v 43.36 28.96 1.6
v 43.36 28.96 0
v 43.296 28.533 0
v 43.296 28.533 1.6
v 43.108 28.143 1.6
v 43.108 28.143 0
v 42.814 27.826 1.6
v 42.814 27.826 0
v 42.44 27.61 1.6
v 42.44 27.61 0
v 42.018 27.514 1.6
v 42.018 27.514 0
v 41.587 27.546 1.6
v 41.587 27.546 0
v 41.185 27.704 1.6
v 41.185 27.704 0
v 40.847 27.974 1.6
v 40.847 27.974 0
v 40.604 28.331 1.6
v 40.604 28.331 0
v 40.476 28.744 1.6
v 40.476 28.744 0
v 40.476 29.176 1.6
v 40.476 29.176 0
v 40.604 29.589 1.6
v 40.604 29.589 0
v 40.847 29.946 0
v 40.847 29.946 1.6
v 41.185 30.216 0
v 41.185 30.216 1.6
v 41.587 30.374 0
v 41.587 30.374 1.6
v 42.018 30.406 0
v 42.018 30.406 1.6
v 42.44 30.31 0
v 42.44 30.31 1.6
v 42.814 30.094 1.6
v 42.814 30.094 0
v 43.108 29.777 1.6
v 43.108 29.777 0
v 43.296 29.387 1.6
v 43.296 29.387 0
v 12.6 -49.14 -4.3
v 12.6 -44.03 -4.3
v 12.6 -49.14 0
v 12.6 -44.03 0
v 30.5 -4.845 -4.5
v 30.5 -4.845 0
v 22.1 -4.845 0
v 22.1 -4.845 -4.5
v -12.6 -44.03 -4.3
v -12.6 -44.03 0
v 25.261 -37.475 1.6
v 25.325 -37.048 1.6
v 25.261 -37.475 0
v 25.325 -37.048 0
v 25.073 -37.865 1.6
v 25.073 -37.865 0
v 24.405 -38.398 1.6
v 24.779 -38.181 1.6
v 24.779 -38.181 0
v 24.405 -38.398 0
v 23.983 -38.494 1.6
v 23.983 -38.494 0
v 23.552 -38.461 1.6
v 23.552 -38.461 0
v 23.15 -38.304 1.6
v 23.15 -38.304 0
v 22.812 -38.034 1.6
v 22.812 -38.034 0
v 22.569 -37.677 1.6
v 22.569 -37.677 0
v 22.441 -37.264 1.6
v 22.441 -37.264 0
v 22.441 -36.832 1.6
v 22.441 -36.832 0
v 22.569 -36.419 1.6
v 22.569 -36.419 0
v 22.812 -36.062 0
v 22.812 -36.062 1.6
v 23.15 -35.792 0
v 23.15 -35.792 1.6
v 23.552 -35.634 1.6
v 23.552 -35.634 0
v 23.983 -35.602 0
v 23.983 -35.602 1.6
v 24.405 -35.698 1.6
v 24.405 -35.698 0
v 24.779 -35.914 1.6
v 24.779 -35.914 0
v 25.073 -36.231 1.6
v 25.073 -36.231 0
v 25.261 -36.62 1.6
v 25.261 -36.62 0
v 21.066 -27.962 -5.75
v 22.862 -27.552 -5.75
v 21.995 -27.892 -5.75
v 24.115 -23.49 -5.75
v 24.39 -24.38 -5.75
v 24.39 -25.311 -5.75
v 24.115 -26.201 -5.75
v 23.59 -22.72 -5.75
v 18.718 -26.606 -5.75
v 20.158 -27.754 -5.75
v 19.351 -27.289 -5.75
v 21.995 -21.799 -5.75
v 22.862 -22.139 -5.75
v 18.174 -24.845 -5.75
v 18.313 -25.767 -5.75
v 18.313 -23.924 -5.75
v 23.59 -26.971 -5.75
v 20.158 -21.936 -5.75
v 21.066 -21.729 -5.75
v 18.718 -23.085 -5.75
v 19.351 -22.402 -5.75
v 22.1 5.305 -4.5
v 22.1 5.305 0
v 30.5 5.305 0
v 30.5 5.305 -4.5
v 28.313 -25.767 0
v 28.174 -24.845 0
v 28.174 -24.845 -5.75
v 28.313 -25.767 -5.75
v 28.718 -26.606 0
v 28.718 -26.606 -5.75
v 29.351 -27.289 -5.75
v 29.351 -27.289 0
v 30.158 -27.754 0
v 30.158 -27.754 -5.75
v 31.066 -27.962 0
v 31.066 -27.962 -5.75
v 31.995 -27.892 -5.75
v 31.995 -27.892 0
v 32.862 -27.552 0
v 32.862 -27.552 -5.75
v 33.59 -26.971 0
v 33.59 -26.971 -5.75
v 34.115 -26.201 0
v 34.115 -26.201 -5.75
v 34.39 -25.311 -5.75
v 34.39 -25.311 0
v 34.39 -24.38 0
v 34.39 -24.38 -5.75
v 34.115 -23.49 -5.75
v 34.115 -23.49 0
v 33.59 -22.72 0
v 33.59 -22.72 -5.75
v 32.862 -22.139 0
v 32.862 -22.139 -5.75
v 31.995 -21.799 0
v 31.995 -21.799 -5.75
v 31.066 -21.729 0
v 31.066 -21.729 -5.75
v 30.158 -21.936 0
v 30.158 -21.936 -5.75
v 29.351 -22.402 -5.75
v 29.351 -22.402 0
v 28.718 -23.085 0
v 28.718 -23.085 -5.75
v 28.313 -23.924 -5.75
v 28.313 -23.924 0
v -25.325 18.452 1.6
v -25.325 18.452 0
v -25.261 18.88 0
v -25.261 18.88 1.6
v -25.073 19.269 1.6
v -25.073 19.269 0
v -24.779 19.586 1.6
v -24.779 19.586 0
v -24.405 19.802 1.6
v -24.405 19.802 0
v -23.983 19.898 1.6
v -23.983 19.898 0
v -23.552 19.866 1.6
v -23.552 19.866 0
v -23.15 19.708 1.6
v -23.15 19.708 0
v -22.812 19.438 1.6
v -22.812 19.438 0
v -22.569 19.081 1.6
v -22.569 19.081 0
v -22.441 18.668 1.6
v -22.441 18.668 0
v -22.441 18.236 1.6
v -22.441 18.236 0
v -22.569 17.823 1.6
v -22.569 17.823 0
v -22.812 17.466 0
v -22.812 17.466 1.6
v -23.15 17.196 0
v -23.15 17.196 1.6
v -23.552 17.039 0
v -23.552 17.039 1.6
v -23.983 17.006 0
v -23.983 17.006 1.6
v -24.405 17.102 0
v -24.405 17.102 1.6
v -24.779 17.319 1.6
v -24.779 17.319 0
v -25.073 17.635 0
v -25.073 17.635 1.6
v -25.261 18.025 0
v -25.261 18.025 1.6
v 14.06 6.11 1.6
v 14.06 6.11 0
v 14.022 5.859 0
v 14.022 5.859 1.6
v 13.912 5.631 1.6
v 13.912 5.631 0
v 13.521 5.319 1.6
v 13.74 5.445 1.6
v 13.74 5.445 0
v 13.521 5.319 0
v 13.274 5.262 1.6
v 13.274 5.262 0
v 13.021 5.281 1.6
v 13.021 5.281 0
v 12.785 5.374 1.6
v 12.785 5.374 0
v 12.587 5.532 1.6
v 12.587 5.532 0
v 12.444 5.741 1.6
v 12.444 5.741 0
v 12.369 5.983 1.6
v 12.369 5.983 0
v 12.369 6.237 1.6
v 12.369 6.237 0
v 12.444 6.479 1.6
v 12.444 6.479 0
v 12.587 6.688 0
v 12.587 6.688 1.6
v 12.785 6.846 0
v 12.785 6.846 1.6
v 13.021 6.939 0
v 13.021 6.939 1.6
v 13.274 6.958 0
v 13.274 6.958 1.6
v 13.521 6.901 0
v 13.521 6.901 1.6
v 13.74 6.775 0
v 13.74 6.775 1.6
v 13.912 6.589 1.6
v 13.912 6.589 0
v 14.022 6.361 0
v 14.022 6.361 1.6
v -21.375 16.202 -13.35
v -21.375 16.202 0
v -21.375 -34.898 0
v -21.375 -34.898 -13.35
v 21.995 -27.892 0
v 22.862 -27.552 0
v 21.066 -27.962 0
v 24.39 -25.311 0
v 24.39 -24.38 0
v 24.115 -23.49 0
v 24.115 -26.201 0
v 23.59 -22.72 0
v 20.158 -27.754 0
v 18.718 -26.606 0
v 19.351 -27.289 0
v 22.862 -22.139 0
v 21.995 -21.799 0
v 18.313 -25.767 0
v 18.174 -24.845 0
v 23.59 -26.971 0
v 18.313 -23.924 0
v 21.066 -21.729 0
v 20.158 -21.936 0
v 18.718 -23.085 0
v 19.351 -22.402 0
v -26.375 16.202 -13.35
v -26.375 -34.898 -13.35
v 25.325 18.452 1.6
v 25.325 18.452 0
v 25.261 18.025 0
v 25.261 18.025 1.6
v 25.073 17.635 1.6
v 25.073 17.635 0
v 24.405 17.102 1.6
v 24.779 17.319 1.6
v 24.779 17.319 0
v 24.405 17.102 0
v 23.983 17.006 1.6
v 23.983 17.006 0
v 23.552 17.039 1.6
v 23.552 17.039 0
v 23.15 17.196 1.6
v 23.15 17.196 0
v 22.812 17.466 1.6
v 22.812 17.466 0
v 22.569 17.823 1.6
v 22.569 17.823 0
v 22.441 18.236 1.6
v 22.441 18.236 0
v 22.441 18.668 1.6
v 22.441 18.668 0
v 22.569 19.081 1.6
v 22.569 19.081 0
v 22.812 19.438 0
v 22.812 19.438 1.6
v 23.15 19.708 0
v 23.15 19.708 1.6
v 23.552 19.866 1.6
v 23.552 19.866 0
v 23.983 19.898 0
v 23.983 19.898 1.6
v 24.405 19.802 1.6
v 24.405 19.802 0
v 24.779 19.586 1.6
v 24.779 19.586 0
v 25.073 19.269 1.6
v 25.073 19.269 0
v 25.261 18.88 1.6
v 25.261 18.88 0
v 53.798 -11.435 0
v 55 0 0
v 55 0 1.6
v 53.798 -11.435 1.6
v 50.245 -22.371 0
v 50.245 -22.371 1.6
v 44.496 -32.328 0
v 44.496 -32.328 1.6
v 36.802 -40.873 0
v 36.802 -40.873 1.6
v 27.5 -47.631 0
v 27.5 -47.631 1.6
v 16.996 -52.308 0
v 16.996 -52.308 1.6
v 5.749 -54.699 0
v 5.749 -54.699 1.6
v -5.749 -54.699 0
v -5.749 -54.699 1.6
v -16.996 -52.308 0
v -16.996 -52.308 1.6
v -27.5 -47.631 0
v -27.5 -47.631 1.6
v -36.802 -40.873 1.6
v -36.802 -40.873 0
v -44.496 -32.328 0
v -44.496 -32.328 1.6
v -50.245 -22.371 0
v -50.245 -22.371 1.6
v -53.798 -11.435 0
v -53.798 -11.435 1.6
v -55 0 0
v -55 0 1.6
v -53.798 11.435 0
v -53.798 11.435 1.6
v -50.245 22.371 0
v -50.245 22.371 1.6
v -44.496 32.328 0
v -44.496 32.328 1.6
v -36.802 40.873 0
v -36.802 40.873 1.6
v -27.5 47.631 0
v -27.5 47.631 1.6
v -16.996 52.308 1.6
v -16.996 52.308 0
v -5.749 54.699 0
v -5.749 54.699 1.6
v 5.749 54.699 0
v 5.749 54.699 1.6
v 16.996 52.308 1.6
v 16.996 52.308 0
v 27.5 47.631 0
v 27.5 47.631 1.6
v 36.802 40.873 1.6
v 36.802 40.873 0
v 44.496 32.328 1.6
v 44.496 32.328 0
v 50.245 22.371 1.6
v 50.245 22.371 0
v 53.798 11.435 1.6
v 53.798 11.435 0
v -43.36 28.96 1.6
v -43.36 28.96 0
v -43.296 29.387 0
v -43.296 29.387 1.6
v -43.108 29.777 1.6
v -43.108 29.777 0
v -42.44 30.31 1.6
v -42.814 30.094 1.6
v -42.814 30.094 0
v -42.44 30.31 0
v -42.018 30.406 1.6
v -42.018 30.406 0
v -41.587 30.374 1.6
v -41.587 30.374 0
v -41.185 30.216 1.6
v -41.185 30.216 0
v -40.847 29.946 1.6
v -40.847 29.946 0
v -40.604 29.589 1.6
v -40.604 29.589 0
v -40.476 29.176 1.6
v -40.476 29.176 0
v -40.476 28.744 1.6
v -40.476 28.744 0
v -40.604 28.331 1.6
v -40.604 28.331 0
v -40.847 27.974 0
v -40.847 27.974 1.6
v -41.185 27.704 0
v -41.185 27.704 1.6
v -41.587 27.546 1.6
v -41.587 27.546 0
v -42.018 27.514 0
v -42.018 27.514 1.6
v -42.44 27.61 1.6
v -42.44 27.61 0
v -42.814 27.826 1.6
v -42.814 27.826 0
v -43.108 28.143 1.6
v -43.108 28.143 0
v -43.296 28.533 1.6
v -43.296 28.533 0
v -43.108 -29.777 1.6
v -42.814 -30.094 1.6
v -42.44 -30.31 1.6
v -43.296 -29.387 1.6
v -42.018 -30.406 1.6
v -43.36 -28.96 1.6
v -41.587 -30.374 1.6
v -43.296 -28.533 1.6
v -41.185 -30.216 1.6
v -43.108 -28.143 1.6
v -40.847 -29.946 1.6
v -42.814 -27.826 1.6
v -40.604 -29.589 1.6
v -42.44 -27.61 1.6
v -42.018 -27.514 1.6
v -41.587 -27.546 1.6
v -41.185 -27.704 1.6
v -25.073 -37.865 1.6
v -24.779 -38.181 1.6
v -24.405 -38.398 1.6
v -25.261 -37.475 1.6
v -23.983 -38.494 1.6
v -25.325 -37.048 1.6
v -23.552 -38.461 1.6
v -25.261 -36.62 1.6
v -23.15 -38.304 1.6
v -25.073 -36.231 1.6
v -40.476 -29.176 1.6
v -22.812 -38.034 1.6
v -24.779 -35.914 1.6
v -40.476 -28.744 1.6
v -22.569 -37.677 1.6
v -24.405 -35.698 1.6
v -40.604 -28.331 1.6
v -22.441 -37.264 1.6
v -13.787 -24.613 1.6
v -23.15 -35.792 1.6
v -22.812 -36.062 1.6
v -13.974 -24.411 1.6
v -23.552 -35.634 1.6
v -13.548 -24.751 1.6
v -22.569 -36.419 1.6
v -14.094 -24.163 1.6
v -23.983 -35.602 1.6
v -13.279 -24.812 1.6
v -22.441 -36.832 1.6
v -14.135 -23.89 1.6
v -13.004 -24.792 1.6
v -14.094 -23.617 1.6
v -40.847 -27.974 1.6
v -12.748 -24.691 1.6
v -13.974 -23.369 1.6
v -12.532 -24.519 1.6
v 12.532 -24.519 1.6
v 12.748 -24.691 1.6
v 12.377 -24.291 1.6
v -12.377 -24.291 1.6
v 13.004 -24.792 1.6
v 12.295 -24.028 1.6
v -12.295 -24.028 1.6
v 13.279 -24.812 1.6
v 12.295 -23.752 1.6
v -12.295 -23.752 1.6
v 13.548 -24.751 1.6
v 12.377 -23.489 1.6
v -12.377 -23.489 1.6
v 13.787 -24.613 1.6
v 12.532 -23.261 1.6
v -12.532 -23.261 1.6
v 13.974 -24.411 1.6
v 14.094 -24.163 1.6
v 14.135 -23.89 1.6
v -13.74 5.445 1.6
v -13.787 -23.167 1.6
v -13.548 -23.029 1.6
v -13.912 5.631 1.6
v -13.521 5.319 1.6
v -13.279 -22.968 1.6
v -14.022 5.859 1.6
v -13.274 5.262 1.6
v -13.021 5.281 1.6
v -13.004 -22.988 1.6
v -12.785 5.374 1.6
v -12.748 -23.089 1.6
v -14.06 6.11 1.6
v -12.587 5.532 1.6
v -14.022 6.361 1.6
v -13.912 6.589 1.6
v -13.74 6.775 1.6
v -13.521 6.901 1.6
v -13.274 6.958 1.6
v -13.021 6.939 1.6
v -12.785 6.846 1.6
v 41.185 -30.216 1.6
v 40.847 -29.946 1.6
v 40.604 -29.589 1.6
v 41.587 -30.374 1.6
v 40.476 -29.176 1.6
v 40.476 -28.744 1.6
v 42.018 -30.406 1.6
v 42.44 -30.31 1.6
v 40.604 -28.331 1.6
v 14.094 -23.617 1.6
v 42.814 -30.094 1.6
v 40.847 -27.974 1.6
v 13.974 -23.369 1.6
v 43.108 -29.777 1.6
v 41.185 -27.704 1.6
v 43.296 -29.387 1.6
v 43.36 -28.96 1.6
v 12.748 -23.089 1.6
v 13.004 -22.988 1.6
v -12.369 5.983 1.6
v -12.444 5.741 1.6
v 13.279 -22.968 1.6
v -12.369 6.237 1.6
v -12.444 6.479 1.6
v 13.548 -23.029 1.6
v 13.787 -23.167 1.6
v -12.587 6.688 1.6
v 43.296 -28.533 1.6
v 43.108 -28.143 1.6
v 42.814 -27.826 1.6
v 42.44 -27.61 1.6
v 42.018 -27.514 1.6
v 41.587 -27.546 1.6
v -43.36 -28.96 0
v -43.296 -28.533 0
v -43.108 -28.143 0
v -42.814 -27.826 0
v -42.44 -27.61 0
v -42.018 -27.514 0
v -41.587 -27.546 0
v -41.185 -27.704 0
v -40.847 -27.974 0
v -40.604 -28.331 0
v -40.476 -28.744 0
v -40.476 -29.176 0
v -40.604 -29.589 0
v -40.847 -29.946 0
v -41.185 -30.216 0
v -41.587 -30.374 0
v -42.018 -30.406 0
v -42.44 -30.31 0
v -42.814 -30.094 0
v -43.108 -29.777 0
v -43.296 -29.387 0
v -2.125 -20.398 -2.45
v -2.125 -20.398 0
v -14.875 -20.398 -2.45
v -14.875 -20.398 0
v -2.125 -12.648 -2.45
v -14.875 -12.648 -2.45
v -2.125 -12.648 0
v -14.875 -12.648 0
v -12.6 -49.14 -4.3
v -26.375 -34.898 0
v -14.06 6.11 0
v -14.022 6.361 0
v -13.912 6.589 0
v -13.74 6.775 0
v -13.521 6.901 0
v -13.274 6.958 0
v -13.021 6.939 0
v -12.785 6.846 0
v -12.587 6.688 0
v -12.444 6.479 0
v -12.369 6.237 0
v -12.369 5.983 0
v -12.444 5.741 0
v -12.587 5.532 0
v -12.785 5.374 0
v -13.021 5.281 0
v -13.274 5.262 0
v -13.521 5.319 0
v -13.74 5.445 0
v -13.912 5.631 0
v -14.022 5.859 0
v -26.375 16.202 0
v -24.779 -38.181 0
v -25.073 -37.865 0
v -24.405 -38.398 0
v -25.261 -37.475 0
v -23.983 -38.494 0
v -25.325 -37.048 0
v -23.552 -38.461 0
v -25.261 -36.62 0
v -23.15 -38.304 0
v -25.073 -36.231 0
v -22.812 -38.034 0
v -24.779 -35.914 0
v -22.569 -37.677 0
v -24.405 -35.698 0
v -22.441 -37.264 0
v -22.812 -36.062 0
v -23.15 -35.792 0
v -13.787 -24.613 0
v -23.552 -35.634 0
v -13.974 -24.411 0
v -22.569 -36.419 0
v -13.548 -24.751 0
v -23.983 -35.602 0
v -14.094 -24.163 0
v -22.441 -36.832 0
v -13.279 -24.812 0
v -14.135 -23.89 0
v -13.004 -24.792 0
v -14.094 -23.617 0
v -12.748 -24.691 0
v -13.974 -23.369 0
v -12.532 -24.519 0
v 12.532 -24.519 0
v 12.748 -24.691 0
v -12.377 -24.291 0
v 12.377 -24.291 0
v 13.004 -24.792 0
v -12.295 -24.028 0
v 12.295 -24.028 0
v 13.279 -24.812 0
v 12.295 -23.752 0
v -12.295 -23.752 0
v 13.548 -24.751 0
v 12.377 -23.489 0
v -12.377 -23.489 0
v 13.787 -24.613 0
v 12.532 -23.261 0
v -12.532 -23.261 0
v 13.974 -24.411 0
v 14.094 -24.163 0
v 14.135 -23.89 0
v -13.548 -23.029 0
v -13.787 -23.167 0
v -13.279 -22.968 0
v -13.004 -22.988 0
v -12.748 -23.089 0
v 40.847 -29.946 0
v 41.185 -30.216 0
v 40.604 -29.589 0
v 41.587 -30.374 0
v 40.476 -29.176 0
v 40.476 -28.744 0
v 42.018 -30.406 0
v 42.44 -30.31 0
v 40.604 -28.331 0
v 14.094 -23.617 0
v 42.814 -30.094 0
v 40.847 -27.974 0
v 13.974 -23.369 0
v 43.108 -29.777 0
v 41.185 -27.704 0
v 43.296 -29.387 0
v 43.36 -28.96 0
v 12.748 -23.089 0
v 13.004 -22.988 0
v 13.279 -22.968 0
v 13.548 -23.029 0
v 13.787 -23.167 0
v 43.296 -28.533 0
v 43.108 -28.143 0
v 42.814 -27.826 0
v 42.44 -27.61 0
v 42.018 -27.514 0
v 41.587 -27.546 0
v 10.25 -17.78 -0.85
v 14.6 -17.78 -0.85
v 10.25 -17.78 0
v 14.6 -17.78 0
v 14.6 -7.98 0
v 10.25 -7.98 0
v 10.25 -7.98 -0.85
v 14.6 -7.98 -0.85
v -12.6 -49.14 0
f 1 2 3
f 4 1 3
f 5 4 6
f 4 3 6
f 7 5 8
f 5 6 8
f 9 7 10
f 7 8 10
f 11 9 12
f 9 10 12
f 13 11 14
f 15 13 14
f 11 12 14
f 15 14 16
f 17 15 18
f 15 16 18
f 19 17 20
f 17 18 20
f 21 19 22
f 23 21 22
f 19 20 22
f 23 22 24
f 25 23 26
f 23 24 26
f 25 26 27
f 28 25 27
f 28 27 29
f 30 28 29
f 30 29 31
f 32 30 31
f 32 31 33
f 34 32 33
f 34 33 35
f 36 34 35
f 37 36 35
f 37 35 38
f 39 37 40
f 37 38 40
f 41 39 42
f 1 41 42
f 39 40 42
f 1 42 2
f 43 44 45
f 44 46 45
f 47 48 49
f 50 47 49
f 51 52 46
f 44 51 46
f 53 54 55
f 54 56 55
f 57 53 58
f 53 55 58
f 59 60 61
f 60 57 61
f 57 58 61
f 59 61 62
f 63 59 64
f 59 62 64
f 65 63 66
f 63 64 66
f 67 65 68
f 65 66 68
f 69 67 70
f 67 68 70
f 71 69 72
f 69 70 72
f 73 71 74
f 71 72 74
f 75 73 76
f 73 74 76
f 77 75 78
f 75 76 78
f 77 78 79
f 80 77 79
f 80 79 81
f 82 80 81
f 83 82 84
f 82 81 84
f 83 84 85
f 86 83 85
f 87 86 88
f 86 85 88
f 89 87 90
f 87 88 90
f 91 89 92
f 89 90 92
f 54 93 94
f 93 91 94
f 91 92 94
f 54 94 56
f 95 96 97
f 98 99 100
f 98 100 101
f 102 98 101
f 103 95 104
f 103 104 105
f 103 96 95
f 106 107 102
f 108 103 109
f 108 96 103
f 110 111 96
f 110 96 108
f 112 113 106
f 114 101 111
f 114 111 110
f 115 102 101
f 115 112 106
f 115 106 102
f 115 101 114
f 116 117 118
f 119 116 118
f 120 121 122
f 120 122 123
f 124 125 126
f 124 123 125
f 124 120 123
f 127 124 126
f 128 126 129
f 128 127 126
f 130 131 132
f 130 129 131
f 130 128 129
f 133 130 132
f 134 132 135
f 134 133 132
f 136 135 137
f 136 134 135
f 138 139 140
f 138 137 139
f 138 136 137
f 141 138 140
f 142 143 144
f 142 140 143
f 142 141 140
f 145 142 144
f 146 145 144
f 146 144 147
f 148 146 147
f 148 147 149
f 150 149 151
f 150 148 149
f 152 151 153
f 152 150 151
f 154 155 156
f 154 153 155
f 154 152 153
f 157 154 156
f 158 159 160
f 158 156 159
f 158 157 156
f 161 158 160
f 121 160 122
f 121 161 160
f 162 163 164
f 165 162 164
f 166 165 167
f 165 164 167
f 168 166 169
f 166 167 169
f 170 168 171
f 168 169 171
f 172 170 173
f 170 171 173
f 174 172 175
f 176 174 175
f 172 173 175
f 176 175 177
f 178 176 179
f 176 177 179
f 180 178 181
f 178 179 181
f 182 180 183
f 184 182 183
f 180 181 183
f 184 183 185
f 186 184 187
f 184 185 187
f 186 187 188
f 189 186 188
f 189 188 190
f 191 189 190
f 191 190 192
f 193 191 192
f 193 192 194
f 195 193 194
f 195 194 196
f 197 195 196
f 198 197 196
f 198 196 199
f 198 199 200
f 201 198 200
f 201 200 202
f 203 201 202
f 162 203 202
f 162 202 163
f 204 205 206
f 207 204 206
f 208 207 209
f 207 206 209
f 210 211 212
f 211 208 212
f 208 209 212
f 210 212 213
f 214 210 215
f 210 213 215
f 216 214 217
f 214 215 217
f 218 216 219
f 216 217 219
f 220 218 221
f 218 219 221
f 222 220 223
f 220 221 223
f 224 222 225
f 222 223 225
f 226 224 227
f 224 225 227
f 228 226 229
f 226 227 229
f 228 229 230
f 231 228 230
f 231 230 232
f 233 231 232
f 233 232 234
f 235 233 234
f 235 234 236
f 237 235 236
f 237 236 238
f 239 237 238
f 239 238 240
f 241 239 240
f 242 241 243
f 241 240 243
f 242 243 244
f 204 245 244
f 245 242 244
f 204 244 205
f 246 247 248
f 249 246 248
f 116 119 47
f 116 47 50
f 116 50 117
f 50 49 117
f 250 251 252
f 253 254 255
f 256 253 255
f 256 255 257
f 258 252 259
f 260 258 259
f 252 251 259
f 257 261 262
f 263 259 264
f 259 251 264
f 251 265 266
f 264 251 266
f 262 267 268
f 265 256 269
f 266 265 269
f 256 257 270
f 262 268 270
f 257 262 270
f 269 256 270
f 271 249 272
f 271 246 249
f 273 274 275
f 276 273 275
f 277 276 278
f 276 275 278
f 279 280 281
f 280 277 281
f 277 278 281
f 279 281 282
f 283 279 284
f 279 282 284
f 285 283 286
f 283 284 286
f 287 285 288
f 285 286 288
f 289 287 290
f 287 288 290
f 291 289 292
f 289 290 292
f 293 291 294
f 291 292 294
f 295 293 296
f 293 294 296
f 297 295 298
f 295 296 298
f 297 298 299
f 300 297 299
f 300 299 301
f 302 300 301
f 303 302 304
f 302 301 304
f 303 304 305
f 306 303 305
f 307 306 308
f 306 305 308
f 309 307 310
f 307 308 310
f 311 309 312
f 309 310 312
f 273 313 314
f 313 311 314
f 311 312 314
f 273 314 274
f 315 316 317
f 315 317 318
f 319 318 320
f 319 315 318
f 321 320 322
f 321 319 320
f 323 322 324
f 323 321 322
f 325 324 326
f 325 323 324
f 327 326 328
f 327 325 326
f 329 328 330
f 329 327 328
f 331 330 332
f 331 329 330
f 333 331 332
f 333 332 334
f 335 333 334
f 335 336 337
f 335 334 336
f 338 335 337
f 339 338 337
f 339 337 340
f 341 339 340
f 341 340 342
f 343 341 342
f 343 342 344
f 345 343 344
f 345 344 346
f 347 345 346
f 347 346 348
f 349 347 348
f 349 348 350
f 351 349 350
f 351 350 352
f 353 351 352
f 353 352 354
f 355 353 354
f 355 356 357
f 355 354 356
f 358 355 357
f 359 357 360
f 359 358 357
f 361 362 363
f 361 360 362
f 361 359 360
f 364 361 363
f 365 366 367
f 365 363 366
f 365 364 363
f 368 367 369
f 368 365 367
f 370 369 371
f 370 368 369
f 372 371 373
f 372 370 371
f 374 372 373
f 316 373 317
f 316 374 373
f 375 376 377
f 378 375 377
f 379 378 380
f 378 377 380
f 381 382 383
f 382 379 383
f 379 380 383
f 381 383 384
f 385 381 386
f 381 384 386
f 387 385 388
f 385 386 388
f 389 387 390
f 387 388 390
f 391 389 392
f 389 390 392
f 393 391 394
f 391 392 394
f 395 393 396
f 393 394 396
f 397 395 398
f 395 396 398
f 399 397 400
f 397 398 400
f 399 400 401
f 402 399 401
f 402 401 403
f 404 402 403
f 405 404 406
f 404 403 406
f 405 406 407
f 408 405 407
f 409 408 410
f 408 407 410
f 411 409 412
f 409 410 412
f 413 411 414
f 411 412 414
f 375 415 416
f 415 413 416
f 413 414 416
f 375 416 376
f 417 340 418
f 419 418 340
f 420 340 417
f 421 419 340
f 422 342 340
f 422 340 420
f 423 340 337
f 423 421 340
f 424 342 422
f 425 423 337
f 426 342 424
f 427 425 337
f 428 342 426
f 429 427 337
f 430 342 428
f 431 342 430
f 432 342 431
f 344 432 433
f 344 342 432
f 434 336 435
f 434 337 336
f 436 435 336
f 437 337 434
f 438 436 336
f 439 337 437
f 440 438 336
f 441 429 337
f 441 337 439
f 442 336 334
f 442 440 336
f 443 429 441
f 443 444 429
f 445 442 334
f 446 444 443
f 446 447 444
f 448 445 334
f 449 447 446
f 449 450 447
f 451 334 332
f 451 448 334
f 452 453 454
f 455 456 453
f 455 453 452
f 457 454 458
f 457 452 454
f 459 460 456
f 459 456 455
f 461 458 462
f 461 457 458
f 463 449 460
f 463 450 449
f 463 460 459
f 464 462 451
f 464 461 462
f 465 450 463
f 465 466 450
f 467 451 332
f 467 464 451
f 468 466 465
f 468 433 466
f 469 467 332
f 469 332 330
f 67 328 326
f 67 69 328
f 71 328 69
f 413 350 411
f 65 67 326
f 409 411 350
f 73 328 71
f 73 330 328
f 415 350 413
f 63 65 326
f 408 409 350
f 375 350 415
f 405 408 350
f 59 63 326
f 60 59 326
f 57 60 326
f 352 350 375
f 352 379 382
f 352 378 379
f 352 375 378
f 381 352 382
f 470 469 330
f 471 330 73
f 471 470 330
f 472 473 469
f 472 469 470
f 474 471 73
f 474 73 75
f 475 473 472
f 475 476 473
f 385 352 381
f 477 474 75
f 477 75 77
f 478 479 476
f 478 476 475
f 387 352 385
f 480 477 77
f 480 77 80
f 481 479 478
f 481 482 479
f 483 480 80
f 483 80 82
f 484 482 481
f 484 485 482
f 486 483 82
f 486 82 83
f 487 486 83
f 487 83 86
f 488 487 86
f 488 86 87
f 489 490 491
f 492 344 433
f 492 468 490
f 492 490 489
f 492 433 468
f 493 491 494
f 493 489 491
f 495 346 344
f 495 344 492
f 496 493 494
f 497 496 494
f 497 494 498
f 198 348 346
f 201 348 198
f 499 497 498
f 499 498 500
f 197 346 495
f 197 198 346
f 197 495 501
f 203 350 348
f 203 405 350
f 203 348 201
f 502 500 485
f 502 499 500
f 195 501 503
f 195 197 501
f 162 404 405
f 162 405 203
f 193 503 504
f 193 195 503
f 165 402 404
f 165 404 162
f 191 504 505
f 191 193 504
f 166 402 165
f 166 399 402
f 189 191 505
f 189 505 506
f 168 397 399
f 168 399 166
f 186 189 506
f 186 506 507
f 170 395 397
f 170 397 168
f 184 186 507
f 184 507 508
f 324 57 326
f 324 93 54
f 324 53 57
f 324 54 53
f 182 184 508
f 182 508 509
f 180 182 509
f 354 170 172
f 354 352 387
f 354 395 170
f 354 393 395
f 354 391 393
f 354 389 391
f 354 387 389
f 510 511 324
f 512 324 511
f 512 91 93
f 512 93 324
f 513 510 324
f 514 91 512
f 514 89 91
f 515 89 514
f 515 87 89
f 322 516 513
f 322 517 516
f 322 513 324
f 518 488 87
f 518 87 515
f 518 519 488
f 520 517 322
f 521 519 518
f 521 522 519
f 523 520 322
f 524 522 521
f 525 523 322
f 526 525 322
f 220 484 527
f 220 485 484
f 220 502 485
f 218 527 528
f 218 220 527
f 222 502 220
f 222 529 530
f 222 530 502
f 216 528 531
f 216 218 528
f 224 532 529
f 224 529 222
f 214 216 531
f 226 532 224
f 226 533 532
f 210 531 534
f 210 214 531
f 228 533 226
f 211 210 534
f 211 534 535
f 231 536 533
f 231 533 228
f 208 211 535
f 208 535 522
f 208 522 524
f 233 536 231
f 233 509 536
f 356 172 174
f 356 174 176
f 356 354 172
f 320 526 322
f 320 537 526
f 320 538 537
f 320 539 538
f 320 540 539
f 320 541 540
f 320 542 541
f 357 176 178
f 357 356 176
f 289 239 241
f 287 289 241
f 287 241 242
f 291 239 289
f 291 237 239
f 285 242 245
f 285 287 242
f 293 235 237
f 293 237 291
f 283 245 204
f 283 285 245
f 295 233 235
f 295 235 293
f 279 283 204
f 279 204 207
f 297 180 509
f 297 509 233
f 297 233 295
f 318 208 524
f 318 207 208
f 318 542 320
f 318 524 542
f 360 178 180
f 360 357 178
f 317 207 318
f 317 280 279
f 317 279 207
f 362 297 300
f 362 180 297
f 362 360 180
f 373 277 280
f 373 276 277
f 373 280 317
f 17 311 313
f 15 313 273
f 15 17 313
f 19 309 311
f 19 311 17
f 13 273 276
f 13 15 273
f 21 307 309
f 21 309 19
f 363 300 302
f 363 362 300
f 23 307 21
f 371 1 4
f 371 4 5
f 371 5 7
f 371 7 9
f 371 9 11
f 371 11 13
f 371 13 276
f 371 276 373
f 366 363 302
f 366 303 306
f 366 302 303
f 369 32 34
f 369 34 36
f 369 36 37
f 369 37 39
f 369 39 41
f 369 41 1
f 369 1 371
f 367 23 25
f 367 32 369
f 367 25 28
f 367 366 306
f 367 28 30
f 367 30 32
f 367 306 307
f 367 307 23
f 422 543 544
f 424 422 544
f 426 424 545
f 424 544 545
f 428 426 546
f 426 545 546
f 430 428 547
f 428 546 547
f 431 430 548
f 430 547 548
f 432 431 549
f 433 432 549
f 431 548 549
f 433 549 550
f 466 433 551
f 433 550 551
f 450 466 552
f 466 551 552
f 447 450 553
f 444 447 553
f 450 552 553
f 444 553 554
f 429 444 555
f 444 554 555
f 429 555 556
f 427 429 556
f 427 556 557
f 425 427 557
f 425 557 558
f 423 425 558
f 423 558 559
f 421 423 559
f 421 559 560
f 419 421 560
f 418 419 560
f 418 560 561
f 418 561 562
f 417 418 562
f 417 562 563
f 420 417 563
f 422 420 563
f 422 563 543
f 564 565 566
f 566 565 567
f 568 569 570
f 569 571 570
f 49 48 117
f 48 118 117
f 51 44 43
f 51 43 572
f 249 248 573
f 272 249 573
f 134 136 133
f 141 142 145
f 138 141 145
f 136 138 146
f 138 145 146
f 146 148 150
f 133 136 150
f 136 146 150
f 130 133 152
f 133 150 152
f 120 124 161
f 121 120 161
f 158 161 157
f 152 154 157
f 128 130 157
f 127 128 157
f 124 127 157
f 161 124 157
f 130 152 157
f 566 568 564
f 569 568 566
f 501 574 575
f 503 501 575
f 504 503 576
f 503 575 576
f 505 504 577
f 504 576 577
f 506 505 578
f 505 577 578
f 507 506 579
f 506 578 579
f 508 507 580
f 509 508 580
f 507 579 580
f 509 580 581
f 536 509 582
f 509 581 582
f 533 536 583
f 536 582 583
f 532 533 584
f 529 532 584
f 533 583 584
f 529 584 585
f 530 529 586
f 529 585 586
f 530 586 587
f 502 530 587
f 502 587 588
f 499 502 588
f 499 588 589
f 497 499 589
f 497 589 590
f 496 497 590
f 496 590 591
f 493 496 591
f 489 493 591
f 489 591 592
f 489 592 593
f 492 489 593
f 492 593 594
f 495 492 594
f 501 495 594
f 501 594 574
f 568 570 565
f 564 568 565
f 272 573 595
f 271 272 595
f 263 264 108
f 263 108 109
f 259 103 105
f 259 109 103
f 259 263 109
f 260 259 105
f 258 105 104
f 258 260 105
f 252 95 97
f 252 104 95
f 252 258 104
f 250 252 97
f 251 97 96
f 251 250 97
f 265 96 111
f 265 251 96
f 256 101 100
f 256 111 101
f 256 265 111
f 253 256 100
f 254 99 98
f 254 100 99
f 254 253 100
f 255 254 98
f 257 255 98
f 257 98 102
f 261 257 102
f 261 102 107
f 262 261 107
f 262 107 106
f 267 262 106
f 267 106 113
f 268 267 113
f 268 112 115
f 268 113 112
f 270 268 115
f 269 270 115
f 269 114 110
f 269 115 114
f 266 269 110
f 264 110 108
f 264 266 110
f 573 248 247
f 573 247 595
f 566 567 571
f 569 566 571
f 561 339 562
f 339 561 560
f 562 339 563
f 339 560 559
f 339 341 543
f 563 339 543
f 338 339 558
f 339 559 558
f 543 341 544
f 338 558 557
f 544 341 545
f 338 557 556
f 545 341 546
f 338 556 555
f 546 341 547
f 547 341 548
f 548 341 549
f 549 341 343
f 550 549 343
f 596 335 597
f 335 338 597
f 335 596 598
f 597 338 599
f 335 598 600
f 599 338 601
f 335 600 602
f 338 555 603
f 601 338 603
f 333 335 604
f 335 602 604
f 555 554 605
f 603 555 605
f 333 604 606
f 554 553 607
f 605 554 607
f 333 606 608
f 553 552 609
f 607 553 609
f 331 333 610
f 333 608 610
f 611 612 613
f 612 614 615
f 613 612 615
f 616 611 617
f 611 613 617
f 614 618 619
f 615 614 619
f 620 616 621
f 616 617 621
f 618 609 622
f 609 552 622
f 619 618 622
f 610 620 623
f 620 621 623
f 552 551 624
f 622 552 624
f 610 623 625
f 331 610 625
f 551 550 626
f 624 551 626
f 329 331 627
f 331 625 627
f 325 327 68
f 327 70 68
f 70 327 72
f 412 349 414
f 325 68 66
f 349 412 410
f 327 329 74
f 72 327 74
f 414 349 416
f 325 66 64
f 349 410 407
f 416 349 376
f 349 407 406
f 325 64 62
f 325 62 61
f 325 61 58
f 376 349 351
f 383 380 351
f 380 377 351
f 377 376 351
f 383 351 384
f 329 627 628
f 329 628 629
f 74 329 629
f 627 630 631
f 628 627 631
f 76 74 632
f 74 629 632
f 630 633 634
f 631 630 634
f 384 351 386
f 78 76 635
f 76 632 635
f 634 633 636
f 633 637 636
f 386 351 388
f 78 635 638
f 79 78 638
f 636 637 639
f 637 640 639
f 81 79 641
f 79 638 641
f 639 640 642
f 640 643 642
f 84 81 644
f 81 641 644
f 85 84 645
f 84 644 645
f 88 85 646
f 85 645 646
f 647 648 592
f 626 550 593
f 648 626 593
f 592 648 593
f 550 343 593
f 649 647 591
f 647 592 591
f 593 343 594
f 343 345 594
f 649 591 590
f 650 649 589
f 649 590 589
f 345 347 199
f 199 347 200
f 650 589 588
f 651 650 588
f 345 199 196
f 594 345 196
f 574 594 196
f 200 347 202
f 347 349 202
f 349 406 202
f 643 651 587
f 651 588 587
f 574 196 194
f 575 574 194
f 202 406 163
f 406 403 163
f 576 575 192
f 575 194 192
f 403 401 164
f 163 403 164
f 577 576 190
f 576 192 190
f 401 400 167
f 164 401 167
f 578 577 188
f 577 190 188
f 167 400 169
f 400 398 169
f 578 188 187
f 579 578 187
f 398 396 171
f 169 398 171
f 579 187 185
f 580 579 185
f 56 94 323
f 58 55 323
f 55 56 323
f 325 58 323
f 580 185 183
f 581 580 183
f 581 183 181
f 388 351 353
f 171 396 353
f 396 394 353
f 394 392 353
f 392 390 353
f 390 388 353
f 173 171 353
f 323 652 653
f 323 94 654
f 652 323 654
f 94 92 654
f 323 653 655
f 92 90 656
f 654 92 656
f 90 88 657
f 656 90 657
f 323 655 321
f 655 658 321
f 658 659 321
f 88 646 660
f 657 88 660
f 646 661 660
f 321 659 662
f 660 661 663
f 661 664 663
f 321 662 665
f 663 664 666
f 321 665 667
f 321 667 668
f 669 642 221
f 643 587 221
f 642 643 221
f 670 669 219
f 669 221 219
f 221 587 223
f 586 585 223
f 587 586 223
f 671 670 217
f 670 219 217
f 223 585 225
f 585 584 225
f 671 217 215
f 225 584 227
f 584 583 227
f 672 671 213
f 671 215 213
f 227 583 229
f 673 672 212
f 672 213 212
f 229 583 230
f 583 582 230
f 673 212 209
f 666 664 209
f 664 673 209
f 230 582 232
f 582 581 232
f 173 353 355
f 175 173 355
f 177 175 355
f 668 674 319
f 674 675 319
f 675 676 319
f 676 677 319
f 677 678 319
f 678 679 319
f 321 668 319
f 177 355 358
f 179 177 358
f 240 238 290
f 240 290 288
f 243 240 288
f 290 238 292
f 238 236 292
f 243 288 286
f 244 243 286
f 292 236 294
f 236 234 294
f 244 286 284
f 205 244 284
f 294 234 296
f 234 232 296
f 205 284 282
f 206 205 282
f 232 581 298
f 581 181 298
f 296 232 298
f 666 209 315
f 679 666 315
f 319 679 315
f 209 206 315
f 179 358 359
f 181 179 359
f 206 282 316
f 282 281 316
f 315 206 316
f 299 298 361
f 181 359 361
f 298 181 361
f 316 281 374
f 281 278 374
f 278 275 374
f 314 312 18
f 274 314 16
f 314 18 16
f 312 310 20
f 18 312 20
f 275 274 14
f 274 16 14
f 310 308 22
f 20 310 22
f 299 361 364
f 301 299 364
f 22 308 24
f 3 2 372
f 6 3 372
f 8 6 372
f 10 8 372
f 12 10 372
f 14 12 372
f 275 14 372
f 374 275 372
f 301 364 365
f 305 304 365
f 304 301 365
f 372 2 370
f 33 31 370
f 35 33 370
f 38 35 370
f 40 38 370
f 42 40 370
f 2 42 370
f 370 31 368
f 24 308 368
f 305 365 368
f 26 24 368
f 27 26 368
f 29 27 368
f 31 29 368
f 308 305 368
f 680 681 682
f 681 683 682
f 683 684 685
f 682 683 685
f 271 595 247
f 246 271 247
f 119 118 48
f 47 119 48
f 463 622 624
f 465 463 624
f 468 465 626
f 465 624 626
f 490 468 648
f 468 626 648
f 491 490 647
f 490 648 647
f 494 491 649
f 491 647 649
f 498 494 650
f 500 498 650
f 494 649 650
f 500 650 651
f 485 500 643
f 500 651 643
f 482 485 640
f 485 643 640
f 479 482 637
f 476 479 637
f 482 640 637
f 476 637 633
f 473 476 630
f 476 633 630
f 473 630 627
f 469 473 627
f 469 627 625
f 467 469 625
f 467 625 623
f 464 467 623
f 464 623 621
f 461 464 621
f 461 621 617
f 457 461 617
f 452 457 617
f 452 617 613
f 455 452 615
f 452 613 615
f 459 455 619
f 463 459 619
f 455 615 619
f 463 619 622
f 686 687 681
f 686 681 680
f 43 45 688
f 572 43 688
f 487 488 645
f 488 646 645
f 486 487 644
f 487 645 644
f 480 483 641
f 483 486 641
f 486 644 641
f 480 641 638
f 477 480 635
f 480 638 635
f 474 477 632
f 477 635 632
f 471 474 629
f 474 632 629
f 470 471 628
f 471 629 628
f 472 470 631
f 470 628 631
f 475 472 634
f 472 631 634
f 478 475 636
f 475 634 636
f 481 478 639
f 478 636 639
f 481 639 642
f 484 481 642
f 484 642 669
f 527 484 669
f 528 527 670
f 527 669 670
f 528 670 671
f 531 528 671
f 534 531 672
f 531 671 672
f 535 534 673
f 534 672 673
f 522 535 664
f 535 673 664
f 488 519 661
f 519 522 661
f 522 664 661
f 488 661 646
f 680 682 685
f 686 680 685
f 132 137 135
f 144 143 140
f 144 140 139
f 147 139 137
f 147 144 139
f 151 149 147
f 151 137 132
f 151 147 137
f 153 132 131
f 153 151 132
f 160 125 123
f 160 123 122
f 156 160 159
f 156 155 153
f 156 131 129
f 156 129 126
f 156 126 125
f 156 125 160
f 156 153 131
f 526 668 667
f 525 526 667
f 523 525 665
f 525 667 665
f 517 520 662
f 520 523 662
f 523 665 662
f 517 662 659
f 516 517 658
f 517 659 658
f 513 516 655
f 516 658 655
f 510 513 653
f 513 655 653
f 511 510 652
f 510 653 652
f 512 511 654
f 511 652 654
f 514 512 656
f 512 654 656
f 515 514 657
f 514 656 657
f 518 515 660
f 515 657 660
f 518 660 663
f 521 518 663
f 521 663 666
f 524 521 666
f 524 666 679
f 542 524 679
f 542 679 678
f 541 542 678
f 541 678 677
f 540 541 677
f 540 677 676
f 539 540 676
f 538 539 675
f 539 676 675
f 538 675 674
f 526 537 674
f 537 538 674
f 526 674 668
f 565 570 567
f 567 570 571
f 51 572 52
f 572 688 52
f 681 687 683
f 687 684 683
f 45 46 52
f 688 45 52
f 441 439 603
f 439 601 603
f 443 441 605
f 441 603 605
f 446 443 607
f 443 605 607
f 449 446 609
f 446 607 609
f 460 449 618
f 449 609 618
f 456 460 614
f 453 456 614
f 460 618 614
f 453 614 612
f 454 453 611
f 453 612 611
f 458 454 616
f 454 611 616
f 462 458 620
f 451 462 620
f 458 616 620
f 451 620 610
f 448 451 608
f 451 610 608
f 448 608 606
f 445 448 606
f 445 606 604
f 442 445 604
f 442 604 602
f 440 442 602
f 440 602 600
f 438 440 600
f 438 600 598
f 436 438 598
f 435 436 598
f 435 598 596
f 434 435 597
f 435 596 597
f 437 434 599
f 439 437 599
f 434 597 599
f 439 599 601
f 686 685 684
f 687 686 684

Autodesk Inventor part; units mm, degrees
ref_plane "YZ Plane" through (0, 0, 0) normal (1, 0, 0) x (0, 1, 0)
ref_plane "XZ Plane" through (0, 0, 0) normal (0, 1, 0) x (-1, 0, 0)
ref_plane "XY Plane" through (0, 0, 0) normal (0, 0, 1) x (1, 0, 0)
sketch "Boceto1" plane through (0, 0, 0) normal (0, 0, 1) x (1, 0, 0)
  circle A0 centre (0, 0) radius 55
  dimension "d0" = 110
extrude "Extrusión1" add sketch "Boceto1" along normal blind 1.6
sketch "Boceto2" plane through (0, 0, 0) normal (0, 0, -1) x (-1, 0, 0)
  circle A0 centre (41.91, -28.96) radius 1.45
  line L0 (41.91, -28.96) -> (41.91, 0) construction
  line L1 (41.91, -28.96) -> (0, -28.96) construction
  line L2 (0, 0) -> (41.91, 0) construction
  circle A1 centre (0, 0) radius 55 construction
  line L3 (0, -28.96) -> (0, 0) construction
  line L4 (23.875, 0) -> (23.875, -37.0478) construction
  line L5 (23.875, -37.0478) -> (0, -37.0478) construction
  circle A2 centre (23.875, -37.0478) radius 1.45
  line L6 (23.875, -37.0478) -> (23.875, -49.5478) construction
  line L7 (23.875, 0) -> (23.875, 18.4522) construction
  circle A3 centre (23.875, 18.4522) radius 1.45
  line L8 (13.21, -23.89) -> (13.21, 6.11) construction
  circle A4 centre (13.21, -23.89) radius 0.925
  circle A5 centre (13.21, 6.11) radius 0.85
  line L9 (13.21, -23.89) -> (13.21, -53.39) construction
  line L10 (0, 0) -> (0, -55) construction
  dimension "d3" = 2.9
  dimension "d5" = 41.91
  dimension "d6" = 23.875
  dimension "d8" = 12.5
  dimension "d13" = 55.5
  dimension "d14" = 1.85
  dimension "d15" = 30
  dimension "d16" = 1.7
  dimension "d17" = 13.21
  dimension "d18" = 29.5
  dimension "d55" = 26.04
extrude "Extrusión2" cut sketch "Boceto2" against normal blind 1.6 contours A0
mirror "Simetría1" about plane through (0, 0, 0) normal (0, 1, 0) of "Extrusión2"
mirror "Simetría2" about plane through (0, 0, 0) normal (1, 0, 0) of "Extrusión2", "Simetría1"
extrude "Extrusión3" cut sketch "Boceto2" against normal blind 1.6 contours A2 | A3 | A4 | A5
mirror "Simetría3" about plane through (0, 0, 0) normal (1, 0, 0) of "Extrusión3"
sketch "Boceto4" plane through (0, 0, 0) normal (0, 0, -1) x (-1, 0, 0)
  line L0 (21.375, -34.8978) -> (26.375, -34.8978)
  line L1 (26.375, -34.8978) -> (26.375, 16.2022)
  line L2 (26.375, 16.2022) -> (21.375, 16.2022)
  line L3 (21.375, 16.2022) -> (21.375, -34.8978)
  circle A0 centre (-23.875, 18.4522) radius 1.45 construction
  circle A1 centre (-13.21, -23.89) radius 0.925 construction
  circle A2 centre (-23.875, -37.0478) radius 1.45 construction
  circle A3 centre (-13.21, 6.11) radius 0.85 construction
  circle A4 centre (23.875, 18.4522) radius 1.45 construction
  circle A5 centre (13.21, -23.89) radius 0.925 construction
  circle A6 centre (23.875, -37.0478) radius 1.45 construction
  circle A7 centre (13.21, 6.11) radius 0.85 construction
  circle A8 centre (-41.91, 28.96) radius 1.45 construction
  circle A9 centre (-41.91, -28.96) radius 1.45 construction
  circle A10 centre (41.91, 28.96) radius 1.45 construction
  circle A11 centre (41.91, -28.96) radius 1.45 construction
  circle A12 centre (0, 0) radius 55 construction
  circle A13 centre (23.875, -37.0478) radius 1.45 construction
  circle A14 centre (23.875, 18.4522) radius 1.45 construction
  line L4 (23.875, -37.0478) -> (23.875, 18.4522) construction
  line L5 (-12.6, -49.14) -> (12.6, -49.14)
  line L6 (12.6, -49.14) -> (12.6, -44.03)
  line L7 (12.6, -44.03) -> (-12.6, -44.03)
  line L8 (-12.6, -44.03) -> (-12.6, -49.14)
  line L9 (0, 0) -> (0, -44.03) construction
  line L10 (0, -49.14) -> (0, -55) construction
  line L11 (-7.5, 19) -> (7.5, 19)
  line L12 (7.5, 19) -> (7.5, 21.5)
  line L13 (7.5, 21.5) -> (-7.5, 21.5)
  line L14 (-7.5, 21.5) -> (-7.5, 19)
  line L15 (0, 0) -> (0, 19) construction
  line L16 (0, 21.5) -> (0, 55) construction
  line L17 (-30.4995, -4.8454) -> (-22.0995, -4.8454)
  line L18 (-22.0995, -4.8454) -> (-22.0995, 5.3046)
  line L19 (-22.0995, 5.3046) -> (-30.4995, 5.3046)
  line L20 (-30.4995, 5.3046) -> (-30.4995, -4.8454)
  line L21 (-26.2995, 5.3046) -> (-26.2995, 48.3046) construction
  circle A15 centre (0, 0) radius 55 construction
  line L22 (-30.4995, 0.2296) -> (-54.9995, 0.2296) construction
  line L23 (-14.5995, -17.78) -> (-10.2495, -17.78)
  line L24 (-10.2495, -17.78) -> (-10.2495, -7.98)
  line L25 (-10.2495, -7.98) -> (-14.5995, -7.98)
  line L26 (-14.5995, -7.98) -> (-14.5995, -17.78)
  line L27 (2.125, -20.3978) -> (14.875, -20.3978)
  line L28 (14.875, -20.3978) -> (14.875, -12.6478)
  line L29 (14.875, -12.6478) -> (2.125, -12.6478)
  line L30 (2.125, -12.6478) -> (2.125, -20.3978)
  circle A16 centre (-31.2995, -24.8454) radius 3.125
  circle A17 centre (-21.2995, -24.8454) radius 3.125
  line L31 (-21.2995, -24.8454) -> (-31.2995, -24.8454) construction
  line L32 (-26.2995, -4.8454) -> (-26.2995, -24.8454) construction
  point P0 (23.875, -34.8978)
  dimension "d19" = 51.1
  dimension "d20" = 5
  dimension "d21" = 2.15
  dimension "d24" = 25.2
  dimension "d25" = 5.11
  dimension "d26" = 5.86
  dimension "d27" = 15
  dimension "d28" = 2.5
  dimension "d29" = 33.5
  dimension "d30" = 10.15
  dimension "d31" = 8.4
  dimension "d32" = 43
  dimension "d33" = 24.5
  dimension "d34" = 9.8
  dimension "d35" = 4.35
  dimension "d36" = 26.25
  dimension "d37" = 7.5
  dimension "d38" = 12.75
  dimension "d39" = 7.75
  dimension "d40" = 14.5
  dimension "d41" = 6.5
  dimension "d50" = 6.25
  dimension "d51" = 10
  dimension "d52" = 20
extrude "Extrusión4" add sketch "Boceto4" along normal blind 13.35 separate body contours L3 L2 L1 L0
extrude "Extrusión5" add sketch "Boceto4" along normal blind 4.3 separate body contours L8 L7 L6 L5
extrude "Extrusión6" add sketch "Boceto4" along normal blind 4.5 separate body contours L20 L19 L18 L17
extrude "Extrusión7" add sketch "Boceto4" along normal blind 0.85 separate body contours L26 L25 L24 L23
extrude "Extrusión8" add sketch "Boceto4" along normal blind 2.45 separate body contours L30 L29 L28 L27
extrude "Extrusión9" add sketch "Boceto4" along normal blind 5.75 separate body contours A16 | A17
properties part number "Alphabot_SUP"
